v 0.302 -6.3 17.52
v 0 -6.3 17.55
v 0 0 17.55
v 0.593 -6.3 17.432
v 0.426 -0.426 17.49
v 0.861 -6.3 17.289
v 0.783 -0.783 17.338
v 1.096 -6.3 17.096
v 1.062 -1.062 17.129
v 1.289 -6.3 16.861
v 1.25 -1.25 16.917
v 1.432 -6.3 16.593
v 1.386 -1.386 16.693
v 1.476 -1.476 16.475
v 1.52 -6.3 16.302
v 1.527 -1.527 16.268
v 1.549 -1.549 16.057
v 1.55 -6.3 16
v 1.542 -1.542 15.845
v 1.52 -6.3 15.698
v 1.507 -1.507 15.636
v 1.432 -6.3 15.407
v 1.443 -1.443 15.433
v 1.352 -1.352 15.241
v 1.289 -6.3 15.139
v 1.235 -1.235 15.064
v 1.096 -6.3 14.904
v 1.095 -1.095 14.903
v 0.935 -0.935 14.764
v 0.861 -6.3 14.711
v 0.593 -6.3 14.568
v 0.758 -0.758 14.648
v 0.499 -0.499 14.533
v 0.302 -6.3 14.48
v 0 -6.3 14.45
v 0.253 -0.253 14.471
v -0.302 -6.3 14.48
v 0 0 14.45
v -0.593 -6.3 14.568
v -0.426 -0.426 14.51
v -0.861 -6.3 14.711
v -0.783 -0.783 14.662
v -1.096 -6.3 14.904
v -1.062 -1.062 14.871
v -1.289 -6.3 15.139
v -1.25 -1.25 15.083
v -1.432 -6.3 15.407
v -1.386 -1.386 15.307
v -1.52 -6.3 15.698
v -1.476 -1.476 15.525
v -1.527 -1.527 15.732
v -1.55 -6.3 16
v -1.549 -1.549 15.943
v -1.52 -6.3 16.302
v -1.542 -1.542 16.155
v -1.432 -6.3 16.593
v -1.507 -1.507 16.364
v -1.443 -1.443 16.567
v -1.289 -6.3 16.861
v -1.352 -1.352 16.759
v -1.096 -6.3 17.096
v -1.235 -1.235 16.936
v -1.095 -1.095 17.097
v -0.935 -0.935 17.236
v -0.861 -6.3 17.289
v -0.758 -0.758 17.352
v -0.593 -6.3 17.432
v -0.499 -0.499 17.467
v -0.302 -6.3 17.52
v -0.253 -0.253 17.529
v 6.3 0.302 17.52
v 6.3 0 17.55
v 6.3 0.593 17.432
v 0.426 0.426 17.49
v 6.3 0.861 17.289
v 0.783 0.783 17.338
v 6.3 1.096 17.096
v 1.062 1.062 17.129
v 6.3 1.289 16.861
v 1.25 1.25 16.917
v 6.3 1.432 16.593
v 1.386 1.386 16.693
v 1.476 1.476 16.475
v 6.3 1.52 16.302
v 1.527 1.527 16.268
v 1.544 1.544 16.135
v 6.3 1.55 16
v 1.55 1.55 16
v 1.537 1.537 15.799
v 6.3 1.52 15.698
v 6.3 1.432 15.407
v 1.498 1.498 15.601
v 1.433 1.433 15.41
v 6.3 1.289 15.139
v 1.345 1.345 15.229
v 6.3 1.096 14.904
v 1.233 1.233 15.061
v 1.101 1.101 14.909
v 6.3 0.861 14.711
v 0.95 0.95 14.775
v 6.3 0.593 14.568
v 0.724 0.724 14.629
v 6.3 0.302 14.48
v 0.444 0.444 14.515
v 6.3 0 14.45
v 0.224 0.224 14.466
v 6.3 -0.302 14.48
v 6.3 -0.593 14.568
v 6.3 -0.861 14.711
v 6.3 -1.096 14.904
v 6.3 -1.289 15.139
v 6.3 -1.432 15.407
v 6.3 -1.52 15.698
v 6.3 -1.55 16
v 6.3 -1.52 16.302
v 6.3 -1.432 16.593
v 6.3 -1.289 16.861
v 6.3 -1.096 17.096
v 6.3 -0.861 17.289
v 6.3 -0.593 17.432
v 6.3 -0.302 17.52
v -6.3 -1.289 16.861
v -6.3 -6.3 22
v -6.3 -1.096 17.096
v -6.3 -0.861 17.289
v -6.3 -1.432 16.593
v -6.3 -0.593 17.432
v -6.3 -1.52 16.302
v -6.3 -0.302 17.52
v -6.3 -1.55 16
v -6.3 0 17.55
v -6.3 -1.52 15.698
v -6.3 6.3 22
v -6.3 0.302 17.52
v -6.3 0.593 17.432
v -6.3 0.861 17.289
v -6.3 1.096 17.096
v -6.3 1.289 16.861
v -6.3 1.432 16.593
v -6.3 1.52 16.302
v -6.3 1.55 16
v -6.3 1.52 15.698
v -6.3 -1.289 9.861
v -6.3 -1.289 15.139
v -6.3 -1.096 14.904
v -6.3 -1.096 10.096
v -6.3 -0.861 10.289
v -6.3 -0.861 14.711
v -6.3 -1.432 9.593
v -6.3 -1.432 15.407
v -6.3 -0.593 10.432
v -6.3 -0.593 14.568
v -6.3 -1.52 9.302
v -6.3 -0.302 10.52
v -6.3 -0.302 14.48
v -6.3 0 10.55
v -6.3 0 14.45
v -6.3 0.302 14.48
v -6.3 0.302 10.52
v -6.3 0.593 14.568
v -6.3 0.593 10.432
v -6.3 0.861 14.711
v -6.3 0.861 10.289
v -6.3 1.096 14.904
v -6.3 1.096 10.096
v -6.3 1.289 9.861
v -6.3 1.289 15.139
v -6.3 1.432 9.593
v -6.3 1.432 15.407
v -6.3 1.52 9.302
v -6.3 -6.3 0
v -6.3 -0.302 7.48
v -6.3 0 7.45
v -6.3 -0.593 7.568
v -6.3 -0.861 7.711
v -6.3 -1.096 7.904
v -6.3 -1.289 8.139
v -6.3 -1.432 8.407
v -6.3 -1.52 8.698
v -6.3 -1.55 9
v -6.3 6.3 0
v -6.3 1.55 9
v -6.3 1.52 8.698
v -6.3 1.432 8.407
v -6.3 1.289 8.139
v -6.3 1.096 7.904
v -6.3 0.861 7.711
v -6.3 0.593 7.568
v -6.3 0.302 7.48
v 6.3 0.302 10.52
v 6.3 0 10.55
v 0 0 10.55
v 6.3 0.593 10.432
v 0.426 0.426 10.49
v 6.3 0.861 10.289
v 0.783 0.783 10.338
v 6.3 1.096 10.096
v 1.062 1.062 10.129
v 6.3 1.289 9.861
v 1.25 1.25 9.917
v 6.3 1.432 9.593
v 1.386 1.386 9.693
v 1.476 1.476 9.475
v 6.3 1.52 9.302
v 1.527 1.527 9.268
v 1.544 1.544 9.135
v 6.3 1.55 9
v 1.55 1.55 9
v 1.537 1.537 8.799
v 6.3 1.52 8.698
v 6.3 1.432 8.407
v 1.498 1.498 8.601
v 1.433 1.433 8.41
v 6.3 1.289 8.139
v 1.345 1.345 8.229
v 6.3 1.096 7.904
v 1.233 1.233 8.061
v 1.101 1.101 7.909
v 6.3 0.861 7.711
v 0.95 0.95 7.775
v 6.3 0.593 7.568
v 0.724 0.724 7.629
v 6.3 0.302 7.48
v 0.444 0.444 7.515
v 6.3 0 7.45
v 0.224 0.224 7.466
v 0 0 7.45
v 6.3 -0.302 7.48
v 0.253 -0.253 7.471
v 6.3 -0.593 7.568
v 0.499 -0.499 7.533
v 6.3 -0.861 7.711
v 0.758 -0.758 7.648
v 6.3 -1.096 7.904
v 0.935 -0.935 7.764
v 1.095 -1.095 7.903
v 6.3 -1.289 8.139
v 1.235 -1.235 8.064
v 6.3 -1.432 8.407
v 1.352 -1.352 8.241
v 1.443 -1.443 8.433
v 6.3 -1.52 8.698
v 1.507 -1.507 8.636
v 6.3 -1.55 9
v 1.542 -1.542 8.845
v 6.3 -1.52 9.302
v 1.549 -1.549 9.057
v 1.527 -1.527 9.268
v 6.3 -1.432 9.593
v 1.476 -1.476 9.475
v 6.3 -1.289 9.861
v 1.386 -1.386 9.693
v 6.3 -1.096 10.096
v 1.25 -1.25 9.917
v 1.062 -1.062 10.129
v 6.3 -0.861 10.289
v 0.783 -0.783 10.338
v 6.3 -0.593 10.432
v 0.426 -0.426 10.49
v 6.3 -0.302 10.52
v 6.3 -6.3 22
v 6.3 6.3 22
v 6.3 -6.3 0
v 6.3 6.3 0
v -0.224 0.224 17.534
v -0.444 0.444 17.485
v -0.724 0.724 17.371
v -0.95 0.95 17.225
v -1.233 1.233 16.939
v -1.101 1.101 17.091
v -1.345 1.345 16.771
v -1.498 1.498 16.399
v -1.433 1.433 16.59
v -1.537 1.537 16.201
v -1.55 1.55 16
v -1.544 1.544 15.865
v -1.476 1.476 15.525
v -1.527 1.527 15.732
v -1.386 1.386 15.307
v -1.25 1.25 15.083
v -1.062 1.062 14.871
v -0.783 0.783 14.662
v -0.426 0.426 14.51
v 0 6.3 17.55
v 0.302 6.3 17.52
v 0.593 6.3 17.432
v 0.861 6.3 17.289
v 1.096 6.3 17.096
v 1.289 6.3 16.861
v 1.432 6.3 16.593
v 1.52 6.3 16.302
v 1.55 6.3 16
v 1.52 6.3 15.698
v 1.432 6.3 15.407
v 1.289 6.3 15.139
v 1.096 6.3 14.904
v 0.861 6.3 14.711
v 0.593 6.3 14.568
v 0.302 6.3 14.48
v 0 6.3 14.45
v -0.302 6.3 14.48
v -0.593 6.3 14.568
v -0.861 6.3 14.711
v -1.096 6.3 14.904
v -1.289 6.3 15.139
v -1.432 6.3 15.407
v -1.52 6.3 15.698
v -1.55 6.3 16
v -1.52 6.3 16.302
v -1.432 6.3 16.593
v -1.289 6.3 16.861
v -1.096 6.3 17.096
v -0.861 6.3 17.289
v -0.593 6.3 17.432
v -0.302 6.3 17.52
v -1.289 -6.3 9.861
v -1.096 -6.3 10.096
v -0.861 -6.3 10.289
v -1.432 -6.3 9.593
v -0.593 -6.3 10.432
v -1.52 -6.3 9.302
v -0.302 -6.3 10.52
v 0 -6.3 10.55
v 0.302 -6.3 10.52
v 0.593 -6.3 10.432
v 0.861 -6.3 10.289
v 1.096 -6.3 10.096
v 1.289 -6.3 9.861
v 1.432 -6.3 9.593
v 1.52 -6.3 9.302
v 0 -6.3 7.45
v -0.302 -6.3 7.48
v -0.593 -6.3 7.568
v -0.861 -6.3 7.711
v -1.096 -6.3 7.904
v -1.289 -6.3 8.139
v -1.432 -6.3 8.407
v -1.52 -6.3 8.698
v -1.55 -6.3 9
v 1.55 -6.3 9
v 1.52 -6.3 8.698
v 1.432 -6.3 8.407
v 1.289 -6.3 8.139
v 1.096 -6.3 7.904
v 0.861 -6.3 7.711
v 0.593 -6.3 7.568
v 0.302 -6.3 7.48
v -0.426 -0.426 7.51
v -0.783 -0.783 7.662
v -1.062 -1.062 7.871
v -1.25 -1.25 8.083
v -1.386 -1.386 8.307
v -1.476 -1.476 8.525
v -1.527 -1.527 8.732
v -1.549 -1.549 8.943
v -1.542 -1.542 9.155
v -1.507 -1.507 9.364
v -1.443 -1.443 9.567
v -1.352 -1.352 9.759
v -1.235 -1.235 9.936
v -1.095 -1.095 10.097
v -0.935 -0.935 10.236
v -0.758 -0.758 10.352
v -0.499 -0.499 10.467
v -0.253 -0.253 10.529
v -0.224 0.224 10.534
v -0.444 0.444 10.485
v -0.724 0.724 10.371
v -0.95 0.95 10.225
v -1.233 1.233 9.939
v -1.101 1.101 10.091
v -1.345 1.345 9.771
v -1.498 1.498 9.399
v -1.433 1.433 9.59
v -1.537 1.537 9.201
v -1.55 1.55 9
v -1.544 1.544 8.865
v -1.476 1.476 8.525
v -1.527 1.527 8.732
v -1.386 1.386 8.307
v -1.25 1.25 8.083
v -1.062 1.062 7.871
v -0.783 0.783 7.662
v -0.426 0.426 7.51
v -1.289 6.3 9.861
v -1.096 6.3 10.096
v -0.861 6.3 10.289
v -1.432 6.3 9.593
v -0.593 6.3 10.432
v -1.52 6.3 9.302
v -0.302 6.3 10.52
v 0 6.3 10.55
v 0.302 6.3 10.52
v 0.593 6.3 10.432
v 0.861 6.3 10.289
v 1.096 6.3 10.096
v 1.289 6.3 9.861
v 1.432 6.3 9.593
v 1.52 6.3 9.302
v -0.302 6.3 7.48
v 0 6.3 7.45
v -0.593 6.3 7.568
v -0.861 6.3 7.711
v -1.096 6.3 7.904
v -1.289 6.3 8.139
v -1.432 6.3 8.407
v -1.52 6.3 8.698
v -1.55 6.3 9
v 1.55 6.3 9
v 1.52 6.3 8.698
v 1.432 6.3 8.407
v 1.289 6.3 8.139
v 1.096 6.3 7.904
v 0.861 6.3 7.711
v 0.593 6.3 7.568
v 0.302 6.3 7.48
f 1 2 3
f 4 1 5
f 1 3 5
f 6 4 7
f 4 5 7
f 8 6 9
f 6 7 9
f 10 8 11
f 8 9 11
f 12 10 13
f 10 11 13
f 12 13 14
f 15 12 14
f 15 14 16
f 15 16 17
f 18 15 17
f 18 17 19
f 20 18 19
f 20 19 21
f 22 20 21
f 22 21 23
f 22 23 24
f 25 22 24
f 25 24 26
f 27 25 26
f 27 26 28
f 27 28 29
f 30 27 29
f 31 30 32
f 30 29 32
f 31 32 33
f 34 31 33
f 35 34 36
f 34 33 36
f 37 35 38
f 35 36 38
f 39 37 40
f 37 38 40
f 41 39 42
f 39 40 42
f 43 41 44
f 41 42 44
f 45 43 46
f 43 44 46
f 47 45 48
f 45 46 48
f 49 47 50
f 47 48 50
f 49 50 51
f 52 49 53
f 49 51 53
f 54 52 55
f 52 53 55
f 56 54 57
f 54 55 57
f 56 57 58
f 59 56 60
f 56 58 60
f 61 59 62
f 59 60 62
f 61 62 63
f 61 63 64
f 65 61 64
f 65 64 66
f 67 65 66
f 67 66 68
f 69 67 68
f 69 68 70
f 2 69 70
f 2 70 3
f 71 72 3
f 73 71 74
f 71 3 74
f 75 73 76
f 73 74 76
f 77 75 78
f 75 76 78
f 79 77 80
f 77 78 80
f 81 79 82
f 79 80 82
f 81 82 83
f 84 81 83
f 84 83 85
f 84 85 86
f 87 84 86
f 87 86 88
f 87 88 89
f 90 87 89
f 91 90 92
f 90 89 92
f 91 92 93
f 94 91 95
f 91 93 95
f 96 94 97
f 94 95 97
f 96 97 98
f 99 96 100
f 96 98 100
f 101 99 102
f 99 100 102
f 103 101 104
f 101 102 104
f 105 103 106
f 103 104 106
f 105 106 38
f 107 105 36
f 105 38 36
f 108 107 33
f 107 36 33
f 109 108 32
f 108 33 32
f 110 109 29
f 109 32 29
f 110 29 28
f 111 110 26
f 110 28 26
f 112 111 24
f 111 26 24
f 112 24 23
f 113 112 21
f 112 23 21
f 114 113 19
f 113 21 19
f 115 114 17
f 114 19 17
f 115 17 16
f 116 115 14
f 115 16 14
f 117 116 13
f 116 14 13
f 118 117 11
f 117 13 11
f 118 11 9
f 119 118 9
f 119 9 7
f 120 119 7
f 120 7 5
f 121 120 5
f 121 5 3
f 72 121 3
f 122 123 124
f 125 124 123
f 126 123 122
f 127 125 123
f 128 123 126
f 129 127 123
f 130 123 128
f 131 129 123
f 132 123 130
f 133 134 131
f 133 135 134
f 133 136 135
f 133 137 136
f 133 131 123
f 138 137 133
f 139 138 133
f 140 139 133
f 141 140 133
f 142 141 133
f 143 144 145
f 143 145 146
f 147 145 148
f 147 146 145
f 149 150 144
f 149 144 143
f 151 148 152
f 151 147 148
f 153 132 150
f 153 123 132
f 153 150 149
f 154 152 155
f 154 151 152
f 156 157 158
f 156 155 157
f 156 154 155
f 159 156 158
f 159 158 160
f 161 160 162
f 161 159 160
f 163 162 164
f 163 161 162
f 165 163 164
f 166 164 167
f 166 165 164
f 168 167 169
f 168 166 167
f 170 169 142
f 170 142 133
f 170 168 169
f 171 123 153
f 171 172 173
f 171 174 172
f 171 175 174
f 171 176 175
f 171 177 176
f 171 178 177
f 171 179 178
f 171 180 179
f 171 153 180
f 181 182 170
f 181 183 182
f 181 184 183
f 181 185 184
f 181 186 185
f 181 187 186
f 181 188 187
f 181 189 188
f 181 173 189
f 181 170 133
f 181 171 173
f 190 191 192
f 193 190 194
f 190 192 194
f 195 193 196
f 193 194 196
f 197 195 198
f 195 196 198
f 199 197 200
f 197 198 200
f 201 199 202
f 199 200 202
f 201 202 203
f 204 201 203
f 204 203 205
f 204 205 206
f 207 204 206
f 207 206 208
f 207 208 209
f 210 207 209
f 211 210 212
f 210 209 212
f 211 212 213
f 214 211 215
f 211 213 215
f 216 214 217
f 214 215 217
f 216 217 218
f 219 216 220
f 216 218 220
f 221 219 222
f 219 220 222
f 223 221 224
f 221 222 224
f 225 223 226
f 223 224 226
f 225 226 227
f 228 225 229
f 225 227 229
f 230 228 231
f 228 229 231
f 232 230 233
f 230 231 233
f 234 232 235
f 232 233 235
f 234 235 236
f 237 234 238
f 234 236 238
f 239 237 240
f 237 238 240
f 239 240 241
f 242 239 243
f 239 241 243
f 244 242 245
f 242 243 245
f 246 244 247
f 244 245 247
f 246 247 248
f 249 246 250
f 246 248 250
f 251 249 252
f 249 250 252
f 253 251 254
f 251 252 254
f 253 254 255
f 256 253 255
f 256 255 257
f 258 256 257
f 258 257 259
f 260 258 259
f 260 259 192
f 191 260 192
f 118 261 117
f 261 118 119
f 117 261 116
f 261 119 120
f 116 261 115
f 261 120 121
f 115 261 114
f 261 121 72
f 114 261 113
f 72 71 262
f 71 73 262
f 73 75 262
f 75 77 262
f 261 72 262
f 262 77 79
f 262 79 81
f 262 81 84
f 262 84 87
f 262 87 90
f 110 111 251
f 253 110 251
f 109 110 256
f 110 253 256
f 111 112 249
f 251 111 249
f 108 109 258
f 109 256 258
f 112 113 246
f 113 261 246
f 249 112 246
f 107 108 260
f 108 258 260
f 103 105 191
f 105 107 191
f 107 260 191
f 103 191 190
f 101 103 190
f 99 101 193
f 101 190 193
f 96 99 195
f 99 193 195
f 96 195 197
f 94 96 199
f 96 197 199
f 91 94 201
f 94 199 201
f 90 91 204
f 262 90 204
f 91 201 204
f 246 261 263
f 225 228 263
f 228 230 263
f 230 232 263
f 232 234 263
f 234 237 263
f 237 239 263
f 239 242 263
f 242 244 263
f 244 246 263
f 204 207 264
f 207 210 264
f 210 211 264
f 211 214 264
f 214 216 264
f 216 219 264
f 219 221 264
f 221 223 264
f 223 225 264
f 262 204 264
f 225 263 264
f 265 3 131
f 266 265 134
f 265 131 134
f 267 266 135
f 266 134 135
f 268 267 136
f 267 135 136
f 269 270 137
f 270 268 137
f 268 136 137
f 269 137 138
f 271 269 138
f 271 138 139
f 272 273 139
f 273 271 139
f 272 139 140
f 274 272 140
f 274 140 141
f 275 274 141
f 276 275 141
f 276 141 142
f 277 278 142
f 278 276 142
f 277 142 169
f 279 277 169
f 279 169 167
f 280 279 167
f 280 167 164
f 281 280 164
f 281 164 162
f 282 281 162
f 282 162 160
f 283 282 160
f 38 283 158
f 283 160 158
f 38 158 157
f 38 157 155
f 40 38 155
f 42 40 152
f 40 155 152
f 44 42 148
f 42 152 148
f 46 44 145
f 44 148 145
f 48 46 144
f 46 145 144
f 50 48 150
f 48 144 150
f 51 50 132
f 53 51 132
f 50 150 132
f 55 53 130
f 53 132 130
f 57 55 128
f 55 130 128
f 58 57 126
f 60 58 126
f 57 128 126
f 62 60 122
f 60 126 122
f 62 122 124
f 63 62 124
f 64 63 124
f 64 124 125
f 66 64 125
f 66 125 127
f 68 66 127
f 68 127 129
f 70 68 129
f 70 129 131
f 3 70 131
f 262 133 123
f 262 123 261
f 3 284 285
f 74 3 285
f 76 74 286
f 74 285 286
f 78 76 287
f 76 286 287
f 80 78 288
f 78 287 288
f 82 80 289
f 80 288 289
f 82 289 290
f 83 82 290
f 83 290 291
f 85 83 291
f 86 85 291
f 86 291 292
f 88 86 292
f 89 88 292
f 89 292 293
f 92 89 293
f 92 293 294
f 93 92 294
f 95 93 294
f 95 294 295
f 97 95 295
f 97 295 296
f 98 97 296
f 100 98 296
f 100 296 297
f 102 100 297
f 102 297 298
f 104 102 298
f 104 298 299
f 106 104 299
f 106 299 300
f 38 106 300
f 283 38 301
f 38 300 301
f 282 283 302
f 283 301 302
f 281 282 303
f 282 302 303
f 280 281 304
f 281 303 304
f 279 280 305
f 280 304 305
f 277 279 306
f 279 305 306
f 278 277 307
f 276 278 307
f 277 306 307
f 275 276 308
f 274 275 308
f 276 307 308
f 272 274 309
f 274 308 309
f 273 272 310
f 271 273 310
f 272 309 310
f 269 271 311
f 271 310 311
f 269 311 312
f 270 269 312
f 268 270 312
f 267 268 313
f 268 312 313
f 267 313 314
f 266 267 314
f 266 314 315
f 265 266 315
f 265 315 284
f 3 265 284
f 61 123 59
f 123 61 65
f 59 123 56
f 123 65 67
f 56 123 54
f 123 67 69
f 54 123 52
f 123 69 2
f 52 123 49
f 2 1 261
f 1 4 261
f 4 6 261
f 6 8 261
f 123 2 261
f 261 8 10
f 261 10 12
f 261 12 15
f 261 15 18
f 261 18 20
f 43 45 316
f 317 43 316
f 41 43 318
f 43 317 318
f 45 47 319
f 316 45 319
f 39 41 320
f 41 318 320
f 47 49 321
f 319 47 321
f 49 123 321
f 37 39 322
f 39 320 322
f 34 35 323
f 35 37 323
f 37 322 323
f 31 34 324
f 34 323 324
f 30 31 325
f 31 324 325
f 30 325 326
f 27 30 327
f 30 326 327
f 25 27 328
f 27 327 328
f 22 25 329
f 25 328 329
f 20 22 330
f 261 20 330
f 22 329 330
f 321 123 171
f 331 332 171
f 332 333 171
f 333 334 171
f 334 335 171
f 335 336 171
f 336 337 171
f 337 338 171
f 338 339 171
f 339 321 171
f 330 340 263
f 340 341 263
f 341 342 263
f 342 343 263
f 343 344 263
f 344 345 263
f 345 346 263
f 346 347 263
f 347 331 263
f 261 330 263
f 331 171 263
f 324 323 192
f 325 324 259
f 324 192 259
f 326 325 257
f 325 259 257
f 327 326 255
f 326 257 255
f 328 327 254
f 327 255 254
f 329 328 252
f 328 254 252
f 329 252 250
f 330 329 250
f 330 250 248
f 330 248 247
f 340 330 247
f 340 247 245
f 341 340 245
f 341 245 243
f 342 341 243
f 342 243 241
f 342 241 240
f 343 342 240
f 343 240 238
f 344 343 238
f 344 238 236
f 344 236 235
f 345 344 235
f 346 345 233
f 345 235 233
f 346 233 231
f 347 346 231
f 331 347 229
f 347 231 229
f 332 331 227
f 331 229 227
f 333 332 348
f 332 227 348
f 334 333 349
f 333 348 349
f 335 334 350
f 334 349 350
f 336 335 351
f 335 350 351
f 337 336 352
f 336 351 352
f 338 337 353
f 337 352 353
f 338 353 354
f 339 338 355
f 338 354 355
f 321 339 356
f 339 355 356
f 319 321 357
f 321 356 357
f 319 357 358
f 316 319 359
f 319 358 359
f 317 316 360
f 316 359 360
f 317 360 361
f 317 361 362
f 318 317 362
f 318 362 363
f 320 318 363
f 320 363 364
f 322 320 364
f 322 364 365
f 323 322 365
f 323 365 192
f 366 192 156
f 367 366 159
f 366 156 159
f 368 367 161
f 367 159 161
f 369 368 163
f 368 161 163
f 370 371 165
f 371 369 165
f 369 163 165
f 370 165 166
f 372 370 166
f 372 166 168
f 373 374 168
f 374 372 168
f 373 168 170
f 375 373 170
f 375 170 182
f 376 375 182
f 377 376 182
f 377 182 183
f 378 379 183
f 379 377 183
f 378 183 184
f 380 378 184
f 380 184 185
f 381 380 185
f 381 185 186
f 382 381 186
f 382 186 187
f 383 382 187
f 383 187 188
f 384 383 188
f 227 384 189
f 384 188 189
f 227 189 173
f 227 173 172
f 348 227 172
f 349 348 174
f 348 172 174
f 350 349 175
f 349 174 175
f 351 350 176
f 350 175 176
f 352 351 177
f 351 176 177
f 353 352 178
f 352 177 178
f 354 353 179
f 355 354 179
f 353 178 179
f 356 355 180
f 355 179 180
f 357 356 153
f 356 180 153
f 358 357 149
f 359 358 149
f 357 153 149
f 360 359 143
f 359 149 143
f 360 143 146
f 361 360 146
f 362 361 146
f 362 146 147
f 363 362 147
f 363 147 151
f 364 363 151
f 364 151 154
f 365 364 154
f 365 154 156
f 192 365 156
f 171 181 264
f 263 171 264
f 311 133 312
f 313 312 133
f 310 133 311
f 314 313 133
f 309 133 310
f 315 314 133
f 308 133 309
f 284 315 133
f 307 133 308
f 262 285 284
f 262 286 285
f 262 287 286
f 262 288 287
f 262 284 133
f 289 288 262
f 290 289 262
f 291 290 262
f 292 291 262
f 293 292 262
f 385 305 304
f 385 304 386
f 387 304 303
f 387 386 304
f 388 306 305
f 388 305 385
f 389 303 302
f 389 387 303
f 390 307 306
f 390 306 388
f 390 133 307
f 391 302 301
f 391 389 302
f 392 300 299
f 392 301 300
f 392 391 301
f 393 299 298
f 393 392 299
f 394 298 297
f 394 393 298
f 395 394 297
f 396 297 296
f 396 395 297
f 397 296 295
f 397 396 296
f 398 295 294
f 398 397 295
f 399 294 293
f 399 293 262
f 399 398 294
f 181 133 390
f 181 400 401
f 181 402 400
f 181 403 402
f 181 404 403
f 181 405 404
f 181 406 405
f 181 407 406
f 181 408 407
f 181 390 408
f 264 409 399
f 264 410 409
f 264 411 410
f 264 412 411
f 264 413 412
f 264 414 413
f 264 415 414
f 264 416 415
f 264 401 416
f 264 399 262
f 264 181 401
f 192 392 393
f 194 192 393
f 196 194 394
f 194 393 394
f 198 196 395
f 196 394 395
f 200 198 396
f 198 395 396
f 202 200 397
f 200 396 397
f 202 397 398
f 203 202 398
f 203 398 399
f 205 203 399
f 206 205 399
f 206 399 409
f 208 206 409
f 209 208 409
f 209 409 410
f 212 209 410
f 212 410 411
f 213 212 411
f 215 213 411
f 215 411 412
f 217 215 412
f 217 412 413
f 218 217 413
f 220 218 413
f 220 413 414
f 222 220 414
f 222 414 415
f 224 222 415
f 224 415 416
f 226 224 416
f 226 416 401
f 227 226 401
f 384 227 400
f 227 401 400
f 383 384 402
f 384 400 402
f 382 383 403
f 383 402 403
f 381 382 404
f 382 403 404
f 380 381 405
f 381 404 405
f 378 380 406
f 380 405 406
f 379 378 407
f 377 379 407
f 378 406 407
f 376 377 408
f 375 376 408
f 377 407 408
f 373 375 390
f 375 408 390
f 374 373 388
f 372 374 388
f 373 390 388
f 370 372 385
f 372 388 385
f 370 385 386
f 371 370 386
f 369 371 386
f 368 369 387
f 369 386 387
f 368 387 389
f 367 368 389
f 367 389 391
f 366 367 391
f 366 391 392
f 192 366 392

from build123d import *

# Parameters (mm, degrees)
SKETCH_1_W          = 12.6
SKETCH_1_H          = 12.6
EXTRUDE_1_DEPTH     = 22
CUT_EXTRUDE_1_REACH = 28.124
SKETCH_2_R          = 1.55
CUT_EXTRUDE_2_REACH = 28.124
SKETCH_3_R          = 1.55


with BuildPart() as part:
    # 草图1 → 凸台-拉伸1 (new body)
    with BuildSketch(Plane.XY):
        Rectangle(SKETCH_1_W, SKETCH_1_H)
    extrude(amount=EXTRUDE_1_DEPTH)

    # 草图2 → 切除-拉伸1 (cut, up to next)
    with BuildSketch(Plane(origin=(0, 6.3, 0), x_dir=(1, 0, 0), z_dir=(0, 1, 0)), mode=Mode.PRIVATE) as cut_extrude_1_sk1:
        with Locations(Location((0, -9, 0), (0, 0, 270))):
            Circle(SKETCH_2_R)
    cut_extrude_1_tool1 = extrude(cut_extrude_1_sk1.sketch, amount=-CUT_EXTRUDE_1_REACH, mode=Mode.PRIVATE) & part.part
    # 草图2 → 切除-拉伸1 (cut, up to next)
    with BuildSketch(Plane(origin=(0, 6.3, 0), x_dir=(1, 0, 0), z_dir=(0, 1, 0)), mode=Mode.PRIVATE) as cut_extrude_1_sk2:
        with Locations(Location((0, -16, 0), (0, 0, 270))):
            Circle(SKETCH_2_R)
    cut_extrude_1_tool2 = extrude(cut_extrude_1_sk2.sketch, amount=-CUT_EXTRUDE_1_REACH, mode=Mode.PRIVATE) & part.part
    add(cut_extrude_1_tool1.solids().sort_by_distance((0, 6.3, 9))[0], mode=Mode.SUBTRACT)
    add(cut_extrude_1_tool2.solids().sort_by_distance((0, 6.3, 16))[0], mode=Mode.SUBTRACT)

    # 切除-拉伸2: up to this face of the body (flat: up to its plane)
    cut_extrude_2_end = Plane(part.part.faces().sort_by_distance((6.3, 0, 11))[0])
    # 草图3 → 切除-拉伸2 (cut, up to the picked face)
    with BuildSketch(Plane.ZY.offset(6.3), mode=Mode.PRIVATE) as cut_extrude_2_sk1:
        with Locations((9, 0)):
            Circle(SKETCH_3_R)
    cut_extrude_2_tool1 = split(extrude(cut_extrude_2_sk1.sketch, amount=-CUT_EXTRUDE_2_REACH, mode=Mode.PRIVATE), bisect_by=cut_extrude_2_end, keep=Keep.BOTH, mode=Mode.PRIVATE)
    # 草图3 → 切除-拉伸2 (cut, up to the picked face)
    with BuildSketch(Plane.ZY.offset(6.3), mode=Mode.PRIVATE) as cut_extrude_2_sk2:
        with Locations((16, 0)):
            Circle(SKETCH_3_R)
    cut_extrude_2_tool2 = split(extrude(cut_extrude_2_sk2.sketch, amount=-CUT_EXTRUDE_2_REACH, mode=Mode.PRIVATE), bisect_by=cut_extrude_2_end, keep=Keep.BOTH, mode=Mode.PRIVATE)
    add(cut_extrude_2_tool1.solids().sort_by(Axis((-6.3, 0, 9), (1, 0, 0)))[0], mode=Mode.SUBTRACT)
    add(cut_extrude_2_tool2.solids().sort_by(Axis((-6.3, 0, 16), (1, 0, 0)))[0], mode=Mode.SUBTRACT)


solid = part.part
